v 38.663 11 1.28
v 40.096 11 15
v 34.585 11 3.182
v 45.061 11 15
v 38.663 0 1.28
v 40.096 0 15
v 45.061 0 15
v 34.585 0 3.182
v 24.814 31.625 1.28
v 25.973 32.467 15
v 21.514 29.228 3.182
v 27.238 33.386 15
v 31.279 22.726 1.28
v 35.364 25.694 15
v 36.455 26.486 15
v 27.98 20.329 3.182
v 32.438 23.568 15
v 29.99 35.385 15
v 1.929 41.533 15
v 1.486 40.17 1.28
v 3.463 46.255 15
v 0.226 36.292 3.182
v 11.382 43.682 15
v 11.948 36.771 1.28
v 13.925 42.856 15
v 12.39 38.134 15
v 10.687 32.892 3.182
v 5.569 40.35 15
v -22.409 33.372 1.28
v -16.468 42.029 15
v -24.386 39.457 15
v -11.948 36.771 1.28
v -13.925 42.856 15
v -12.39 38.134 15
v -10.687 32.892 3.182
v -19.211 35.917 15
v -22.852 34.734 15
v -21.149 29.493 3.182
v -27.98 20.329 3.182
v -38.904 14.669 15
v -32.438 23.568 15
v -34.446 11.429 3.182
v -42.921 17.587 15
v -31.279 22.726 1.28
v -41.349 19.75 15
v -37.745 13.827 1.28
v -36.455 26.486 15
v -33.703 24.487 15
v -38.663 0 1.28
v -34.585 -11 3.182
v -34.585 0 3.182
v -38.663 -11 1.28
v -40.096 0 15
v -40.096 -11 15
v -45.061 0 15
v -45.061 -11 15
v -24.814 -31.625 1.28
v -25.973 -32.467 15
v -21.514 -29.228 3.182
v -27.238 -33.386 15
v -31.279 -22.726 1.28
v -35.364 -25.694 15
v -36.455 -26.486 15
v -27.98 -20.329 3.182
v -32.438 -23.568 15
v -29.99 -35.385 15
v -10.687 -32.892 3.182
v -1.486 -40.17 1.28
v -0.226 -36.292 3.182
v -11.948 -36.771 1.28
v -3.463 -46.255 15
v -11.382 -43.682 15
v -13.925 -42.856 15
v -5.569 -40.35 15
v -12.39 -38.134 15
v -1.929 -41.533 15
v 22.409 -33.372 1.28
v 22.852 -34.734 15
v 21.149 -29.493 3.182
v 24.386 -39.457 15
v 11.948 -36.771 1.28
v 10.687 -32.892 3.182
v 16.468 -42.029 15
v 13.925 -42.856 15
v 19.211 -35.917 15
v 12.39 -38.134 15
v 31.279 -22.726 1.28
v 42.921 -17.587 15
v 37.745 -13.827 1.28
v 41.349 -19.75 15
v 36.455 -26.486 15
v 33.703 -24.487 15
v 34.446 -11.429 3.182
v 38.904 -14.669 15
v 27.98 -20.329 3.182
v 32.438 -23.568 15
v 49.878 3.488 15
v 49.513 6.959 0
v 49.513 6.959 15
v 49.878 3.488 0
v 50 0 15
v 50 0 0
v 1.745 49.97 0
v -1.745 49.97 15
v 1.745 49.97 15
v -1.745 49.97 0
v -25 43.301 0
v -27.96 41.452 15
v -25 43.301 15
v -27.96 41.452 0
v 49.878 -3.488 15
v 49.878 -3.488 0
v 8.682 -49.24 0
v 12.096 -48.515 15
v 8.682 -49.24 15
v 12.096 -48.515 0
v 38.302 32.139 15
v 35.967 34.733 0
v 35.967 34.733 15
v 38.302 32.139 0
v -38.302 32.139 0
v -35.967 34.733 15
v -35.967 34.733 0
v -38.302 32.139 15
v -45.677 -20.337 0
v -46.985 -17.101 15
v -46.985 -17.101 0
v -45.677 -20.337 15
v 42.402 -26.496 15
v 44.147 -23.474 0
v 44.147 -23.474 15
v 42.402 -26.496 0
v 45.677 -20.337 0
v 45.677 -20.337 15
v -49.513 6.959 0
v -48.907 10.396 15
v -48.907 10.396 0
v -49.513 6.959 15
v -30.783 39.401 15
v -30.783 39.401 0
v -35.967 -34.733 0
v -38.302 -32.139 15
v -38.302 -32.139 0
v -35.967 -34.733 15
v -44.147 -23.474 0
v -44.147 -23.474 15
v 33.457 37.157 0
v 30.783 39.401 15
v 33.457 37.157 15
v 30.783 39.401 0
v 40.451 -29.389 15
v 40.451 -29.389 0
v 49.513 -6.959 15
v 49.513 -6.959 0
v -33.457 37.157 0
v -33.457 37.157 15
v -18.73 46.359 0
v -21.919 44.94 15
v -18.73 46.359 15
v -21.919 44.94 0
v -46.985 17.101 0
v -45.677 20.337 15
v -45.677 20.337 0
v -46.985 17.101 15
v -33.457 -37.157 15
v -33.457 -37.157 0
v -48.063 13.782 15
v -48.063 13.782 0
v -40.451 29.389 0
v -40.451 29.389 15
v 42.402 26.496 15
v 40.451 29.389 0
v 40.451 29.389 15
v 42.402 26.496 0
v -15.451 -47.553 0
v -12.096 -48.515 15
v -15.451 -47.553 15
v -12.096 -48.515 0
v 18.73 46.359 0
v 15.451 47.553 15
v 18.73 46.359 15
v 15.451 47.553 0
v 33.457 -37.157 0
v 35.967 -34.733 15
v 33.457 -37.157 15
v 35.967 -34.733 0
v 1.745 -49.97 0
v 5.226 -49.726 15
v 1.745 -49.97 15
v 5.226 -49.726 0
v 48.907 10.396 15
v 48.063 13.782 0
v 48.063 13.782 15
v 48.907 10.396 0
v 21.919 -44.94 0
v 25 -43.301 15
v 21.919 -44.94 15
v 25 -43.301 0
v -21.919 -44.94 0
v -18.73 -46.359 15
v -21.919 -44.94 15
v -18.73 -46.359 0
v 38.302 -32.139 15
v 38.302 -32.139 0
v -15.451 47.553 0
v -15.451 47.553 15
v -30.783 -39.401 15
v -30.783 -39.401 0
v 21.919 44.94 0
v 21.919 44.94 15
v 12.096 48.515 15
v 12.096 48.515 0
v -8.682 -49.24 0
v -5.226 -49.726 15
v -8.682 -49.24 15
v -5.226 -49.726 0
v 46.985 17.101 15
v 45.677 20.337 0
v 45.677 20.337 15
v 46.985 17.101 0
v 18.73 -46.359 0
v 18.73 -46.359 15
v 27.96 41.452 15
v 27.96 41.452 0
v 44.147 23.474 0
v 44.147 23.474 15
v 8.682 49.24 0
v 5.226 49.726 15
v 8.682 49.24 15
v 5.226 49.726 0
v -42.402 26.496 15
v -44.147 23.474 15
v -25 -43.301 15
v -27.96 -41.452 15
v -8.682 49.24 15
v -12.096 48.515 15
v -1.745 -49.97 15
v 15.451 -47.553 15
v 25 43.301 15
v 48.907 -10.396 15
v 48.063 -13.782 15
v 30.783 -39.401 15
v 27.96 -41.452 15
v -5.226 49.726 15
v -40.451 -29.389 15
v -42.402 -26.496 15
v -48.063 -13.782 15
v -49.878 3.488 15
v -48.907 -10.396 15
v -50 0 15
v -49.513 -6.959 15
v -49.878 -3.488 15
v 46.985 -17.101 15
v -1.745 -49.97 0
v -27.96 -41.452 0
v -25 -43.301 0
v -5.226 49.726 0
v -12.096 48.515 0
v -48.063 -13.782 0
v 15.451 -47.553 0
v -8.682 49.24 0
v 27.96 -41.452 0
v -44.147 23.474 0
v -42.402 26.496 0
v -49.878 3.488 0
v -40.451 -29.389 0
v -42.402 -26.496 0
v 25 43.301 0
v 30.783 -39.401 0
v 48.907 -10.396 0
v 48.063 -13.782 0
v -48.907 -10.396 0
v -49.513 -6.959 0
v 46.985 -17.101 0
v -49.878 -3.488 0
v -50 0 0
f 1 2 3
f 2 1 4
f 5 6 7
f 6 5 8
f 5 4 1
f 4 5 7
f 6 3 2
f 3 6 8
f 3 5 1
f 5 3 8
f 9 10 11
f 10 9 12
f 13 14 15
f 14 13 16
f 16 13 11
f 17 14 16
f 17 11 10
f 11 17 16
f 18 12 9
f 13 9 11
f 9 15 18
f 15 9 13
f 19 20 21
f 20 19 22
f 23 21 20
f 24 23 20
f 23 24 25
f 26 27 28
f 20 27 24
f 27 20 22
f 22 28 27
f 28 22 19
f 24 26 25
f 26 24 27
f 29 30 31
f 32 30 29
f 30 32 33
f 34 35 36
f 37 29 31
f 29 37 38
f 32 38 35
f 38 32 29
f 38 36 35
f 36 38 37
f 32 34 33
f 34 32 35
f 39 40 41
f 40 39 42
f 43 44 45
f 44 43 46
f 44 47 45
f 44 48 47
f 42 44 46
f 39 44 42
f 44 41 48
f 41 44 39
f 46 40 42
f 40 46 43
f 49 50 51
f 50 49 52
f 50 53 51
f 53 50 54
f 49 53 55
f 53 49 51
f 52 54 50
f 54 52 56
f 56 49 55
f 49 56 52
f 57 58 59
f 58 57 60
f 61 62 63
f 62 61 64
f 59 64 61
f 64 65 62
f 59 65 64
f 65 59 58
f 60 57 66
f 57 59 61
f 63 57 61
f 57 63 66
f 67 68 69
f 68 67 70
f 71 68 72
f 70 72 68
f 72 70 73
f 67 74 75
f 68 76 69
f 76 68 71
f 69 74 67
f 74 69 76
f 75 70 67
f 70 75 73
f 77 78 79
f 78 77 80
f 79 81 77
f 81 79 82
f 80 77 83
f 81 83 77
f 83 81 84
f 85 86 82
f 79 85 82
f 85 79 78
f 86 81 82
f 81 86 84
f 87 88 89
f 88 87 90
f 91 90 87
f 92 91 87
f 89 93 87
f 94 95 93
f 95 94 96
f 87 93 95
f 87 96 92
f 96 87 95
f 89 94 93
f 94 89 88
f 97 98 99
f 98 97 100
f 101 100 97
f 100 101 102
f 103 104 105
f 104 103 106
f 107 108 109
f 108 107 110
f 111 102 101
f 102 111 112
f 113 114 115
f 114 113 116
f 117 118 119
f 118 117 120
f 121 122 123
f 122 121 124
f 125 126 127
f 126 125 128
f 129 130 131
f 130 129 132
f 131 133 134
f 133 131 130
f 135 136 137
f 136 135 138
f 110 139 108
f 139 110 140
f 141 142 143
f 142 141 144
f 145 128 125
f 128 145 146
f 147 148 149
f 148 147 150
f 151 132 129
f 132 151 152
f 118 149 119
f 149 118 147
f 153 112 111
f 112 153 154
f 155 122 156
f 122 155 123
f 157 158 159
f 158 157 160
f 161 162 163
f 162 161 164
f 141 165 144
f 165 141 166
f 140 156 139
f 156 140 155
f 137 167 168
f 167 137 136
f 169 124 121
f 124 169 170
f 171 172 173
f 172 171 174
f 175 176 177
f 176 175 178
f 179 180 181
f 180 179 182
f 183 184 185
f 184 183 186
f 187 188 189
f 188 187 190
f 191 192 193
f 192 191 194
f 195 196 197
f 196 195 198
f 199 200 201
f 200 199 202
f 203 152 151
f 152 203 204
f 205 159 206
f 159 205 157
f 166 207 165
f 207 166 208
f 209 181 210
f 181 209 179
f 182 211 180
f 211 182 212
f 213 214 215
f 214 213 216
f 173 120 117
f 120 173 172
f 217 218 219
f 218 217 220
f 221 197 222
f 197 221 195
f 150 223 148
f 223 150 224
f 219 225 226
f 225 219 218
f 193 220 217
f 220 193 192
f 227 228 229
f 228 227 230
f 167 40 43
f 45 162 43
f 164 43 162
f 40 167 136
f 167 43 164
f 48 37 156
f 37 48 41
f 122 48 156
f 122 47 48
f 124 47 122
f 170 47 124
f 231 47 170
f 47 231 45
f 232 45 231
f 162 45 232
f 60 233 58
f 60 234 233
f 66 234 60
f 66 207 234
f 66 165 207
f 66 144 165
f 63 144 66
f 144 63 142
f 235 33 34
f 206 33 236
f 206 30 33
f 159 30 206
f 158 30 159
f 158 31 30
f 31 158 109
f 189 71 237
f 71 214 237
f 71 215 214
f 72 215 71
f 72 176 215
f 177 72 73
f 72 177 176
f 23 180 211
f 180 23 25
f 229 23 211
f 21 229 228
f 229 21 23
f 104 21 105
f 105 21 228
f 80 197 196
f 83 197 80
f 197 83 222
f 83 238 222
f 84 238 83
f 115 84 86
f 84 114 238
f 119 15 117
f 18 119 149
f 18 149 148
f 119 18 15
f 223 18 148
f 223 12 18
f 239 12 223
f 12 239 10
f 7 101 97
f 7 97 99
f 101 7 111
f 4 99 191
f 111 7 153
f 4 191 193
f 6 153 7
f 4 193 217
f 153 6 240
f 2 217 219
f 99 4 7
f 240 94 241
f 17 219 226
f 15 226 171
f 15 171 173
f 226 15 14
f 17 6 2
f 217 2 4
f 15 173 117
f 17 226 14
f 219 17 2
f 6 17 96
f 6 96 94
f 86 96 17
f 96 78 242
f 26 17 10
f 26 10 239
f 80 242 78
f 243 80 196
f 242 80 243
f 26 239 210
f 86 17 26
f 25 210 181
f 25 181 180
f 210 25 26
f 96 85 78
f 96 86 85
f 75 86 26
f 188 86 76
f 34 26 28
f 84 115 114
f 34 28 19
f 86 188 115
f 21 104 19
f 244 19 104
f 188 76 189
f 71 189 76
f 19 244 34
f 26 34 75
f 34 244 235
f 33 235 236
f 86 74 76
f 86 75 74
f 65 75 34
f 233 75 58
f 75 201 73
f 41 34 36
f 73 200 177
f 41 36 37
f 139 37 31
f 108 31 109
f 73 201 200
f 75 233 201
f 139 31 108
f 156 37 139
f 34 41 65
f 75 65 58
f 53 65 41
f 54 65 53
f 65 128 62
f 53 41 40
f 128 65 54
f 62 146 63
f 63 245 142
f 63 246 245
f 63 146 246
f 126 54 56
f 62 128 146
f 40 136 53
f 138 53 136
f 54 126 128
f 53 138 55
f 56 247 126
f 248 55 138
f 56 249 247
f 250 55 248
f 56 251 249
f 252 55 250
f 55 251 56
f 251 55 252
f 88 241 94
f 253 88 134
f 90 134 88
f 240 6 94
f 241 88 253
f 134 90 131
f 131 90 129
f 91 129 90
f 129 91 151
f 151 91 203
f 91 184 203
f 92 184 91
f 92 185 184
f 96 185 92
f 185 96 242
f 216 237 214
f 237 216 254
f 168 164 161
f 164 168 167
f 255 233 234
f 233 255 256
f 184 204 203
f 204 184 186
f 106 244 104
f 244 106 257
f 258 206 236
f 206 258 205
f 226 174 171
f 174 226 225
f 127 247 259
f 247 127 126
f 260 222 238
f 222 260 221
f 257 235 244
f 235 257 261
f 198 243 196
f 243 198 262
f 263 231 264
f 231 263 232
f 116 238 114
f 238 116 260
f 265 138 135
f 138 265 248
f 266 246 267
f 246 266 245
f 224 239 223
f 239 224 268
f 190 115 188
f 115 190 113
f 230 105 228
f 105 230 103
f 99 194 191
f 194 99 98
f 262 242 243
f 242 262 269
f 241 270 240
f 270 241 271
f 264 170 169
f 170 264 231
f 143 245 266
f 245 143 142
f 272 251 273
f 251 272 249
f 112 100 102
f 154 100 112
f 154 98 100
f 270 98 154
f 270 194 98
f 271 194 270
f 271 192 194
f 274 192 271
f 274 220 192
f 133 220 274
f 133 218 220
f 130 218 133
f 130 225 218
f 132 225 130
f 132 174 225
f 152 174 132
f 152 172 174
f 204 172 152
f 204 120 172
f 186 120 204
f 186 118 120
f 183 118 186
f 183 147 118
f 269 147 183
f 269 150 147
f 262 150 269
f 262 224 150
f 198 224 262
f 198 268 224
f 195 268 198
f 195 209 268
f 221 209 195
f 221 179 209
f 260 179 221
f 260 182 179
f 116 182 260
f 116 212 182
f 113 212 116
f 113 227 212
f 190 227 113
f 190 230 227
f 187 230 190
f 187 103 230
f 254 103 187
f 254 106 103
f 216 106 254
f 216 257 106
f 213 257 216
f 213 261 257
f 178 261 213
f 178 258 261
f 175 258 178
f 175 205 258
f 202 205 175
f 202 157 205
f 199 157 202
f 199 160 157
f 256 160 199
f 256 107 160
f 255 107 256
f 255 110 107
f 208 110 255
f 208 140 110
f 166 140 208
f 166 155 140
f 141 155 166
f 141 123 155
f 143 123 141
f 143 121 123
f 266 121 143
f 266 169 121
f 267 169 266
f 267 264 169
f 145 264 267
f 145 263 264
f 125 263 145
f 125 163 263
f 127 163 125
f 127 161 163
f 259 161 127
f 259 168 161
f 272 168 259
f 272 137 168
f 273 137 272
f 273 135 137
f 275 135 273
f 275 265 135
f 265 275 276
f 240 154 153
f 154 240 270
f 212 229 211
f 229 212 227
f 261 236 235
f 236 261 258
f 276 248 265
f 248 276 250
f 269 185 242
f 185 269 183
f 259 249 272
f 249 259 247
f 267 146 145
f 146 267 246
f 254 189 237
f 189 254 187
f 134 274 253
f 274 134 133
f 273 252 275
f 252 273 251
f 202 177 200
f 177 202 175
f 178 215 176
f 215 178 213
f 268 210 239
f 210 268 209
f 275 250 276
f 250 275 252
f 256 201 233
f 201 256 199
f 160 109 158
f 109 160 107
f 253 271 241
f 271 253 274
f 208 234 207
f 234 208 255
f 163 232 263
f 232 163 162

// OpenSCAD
$fa=4; // default minimum facet angle is now 0.5
$fs=0.05; // default minimum facet size is now 0.05 mm

difference() {
  cylinder(r = 50, h=15);
  for (i=[0:36:360]) {
    rotate([0, 25, i]) translate([30, 0, 17.5]) cube([4.5, 11, 20]);
  }  
}
